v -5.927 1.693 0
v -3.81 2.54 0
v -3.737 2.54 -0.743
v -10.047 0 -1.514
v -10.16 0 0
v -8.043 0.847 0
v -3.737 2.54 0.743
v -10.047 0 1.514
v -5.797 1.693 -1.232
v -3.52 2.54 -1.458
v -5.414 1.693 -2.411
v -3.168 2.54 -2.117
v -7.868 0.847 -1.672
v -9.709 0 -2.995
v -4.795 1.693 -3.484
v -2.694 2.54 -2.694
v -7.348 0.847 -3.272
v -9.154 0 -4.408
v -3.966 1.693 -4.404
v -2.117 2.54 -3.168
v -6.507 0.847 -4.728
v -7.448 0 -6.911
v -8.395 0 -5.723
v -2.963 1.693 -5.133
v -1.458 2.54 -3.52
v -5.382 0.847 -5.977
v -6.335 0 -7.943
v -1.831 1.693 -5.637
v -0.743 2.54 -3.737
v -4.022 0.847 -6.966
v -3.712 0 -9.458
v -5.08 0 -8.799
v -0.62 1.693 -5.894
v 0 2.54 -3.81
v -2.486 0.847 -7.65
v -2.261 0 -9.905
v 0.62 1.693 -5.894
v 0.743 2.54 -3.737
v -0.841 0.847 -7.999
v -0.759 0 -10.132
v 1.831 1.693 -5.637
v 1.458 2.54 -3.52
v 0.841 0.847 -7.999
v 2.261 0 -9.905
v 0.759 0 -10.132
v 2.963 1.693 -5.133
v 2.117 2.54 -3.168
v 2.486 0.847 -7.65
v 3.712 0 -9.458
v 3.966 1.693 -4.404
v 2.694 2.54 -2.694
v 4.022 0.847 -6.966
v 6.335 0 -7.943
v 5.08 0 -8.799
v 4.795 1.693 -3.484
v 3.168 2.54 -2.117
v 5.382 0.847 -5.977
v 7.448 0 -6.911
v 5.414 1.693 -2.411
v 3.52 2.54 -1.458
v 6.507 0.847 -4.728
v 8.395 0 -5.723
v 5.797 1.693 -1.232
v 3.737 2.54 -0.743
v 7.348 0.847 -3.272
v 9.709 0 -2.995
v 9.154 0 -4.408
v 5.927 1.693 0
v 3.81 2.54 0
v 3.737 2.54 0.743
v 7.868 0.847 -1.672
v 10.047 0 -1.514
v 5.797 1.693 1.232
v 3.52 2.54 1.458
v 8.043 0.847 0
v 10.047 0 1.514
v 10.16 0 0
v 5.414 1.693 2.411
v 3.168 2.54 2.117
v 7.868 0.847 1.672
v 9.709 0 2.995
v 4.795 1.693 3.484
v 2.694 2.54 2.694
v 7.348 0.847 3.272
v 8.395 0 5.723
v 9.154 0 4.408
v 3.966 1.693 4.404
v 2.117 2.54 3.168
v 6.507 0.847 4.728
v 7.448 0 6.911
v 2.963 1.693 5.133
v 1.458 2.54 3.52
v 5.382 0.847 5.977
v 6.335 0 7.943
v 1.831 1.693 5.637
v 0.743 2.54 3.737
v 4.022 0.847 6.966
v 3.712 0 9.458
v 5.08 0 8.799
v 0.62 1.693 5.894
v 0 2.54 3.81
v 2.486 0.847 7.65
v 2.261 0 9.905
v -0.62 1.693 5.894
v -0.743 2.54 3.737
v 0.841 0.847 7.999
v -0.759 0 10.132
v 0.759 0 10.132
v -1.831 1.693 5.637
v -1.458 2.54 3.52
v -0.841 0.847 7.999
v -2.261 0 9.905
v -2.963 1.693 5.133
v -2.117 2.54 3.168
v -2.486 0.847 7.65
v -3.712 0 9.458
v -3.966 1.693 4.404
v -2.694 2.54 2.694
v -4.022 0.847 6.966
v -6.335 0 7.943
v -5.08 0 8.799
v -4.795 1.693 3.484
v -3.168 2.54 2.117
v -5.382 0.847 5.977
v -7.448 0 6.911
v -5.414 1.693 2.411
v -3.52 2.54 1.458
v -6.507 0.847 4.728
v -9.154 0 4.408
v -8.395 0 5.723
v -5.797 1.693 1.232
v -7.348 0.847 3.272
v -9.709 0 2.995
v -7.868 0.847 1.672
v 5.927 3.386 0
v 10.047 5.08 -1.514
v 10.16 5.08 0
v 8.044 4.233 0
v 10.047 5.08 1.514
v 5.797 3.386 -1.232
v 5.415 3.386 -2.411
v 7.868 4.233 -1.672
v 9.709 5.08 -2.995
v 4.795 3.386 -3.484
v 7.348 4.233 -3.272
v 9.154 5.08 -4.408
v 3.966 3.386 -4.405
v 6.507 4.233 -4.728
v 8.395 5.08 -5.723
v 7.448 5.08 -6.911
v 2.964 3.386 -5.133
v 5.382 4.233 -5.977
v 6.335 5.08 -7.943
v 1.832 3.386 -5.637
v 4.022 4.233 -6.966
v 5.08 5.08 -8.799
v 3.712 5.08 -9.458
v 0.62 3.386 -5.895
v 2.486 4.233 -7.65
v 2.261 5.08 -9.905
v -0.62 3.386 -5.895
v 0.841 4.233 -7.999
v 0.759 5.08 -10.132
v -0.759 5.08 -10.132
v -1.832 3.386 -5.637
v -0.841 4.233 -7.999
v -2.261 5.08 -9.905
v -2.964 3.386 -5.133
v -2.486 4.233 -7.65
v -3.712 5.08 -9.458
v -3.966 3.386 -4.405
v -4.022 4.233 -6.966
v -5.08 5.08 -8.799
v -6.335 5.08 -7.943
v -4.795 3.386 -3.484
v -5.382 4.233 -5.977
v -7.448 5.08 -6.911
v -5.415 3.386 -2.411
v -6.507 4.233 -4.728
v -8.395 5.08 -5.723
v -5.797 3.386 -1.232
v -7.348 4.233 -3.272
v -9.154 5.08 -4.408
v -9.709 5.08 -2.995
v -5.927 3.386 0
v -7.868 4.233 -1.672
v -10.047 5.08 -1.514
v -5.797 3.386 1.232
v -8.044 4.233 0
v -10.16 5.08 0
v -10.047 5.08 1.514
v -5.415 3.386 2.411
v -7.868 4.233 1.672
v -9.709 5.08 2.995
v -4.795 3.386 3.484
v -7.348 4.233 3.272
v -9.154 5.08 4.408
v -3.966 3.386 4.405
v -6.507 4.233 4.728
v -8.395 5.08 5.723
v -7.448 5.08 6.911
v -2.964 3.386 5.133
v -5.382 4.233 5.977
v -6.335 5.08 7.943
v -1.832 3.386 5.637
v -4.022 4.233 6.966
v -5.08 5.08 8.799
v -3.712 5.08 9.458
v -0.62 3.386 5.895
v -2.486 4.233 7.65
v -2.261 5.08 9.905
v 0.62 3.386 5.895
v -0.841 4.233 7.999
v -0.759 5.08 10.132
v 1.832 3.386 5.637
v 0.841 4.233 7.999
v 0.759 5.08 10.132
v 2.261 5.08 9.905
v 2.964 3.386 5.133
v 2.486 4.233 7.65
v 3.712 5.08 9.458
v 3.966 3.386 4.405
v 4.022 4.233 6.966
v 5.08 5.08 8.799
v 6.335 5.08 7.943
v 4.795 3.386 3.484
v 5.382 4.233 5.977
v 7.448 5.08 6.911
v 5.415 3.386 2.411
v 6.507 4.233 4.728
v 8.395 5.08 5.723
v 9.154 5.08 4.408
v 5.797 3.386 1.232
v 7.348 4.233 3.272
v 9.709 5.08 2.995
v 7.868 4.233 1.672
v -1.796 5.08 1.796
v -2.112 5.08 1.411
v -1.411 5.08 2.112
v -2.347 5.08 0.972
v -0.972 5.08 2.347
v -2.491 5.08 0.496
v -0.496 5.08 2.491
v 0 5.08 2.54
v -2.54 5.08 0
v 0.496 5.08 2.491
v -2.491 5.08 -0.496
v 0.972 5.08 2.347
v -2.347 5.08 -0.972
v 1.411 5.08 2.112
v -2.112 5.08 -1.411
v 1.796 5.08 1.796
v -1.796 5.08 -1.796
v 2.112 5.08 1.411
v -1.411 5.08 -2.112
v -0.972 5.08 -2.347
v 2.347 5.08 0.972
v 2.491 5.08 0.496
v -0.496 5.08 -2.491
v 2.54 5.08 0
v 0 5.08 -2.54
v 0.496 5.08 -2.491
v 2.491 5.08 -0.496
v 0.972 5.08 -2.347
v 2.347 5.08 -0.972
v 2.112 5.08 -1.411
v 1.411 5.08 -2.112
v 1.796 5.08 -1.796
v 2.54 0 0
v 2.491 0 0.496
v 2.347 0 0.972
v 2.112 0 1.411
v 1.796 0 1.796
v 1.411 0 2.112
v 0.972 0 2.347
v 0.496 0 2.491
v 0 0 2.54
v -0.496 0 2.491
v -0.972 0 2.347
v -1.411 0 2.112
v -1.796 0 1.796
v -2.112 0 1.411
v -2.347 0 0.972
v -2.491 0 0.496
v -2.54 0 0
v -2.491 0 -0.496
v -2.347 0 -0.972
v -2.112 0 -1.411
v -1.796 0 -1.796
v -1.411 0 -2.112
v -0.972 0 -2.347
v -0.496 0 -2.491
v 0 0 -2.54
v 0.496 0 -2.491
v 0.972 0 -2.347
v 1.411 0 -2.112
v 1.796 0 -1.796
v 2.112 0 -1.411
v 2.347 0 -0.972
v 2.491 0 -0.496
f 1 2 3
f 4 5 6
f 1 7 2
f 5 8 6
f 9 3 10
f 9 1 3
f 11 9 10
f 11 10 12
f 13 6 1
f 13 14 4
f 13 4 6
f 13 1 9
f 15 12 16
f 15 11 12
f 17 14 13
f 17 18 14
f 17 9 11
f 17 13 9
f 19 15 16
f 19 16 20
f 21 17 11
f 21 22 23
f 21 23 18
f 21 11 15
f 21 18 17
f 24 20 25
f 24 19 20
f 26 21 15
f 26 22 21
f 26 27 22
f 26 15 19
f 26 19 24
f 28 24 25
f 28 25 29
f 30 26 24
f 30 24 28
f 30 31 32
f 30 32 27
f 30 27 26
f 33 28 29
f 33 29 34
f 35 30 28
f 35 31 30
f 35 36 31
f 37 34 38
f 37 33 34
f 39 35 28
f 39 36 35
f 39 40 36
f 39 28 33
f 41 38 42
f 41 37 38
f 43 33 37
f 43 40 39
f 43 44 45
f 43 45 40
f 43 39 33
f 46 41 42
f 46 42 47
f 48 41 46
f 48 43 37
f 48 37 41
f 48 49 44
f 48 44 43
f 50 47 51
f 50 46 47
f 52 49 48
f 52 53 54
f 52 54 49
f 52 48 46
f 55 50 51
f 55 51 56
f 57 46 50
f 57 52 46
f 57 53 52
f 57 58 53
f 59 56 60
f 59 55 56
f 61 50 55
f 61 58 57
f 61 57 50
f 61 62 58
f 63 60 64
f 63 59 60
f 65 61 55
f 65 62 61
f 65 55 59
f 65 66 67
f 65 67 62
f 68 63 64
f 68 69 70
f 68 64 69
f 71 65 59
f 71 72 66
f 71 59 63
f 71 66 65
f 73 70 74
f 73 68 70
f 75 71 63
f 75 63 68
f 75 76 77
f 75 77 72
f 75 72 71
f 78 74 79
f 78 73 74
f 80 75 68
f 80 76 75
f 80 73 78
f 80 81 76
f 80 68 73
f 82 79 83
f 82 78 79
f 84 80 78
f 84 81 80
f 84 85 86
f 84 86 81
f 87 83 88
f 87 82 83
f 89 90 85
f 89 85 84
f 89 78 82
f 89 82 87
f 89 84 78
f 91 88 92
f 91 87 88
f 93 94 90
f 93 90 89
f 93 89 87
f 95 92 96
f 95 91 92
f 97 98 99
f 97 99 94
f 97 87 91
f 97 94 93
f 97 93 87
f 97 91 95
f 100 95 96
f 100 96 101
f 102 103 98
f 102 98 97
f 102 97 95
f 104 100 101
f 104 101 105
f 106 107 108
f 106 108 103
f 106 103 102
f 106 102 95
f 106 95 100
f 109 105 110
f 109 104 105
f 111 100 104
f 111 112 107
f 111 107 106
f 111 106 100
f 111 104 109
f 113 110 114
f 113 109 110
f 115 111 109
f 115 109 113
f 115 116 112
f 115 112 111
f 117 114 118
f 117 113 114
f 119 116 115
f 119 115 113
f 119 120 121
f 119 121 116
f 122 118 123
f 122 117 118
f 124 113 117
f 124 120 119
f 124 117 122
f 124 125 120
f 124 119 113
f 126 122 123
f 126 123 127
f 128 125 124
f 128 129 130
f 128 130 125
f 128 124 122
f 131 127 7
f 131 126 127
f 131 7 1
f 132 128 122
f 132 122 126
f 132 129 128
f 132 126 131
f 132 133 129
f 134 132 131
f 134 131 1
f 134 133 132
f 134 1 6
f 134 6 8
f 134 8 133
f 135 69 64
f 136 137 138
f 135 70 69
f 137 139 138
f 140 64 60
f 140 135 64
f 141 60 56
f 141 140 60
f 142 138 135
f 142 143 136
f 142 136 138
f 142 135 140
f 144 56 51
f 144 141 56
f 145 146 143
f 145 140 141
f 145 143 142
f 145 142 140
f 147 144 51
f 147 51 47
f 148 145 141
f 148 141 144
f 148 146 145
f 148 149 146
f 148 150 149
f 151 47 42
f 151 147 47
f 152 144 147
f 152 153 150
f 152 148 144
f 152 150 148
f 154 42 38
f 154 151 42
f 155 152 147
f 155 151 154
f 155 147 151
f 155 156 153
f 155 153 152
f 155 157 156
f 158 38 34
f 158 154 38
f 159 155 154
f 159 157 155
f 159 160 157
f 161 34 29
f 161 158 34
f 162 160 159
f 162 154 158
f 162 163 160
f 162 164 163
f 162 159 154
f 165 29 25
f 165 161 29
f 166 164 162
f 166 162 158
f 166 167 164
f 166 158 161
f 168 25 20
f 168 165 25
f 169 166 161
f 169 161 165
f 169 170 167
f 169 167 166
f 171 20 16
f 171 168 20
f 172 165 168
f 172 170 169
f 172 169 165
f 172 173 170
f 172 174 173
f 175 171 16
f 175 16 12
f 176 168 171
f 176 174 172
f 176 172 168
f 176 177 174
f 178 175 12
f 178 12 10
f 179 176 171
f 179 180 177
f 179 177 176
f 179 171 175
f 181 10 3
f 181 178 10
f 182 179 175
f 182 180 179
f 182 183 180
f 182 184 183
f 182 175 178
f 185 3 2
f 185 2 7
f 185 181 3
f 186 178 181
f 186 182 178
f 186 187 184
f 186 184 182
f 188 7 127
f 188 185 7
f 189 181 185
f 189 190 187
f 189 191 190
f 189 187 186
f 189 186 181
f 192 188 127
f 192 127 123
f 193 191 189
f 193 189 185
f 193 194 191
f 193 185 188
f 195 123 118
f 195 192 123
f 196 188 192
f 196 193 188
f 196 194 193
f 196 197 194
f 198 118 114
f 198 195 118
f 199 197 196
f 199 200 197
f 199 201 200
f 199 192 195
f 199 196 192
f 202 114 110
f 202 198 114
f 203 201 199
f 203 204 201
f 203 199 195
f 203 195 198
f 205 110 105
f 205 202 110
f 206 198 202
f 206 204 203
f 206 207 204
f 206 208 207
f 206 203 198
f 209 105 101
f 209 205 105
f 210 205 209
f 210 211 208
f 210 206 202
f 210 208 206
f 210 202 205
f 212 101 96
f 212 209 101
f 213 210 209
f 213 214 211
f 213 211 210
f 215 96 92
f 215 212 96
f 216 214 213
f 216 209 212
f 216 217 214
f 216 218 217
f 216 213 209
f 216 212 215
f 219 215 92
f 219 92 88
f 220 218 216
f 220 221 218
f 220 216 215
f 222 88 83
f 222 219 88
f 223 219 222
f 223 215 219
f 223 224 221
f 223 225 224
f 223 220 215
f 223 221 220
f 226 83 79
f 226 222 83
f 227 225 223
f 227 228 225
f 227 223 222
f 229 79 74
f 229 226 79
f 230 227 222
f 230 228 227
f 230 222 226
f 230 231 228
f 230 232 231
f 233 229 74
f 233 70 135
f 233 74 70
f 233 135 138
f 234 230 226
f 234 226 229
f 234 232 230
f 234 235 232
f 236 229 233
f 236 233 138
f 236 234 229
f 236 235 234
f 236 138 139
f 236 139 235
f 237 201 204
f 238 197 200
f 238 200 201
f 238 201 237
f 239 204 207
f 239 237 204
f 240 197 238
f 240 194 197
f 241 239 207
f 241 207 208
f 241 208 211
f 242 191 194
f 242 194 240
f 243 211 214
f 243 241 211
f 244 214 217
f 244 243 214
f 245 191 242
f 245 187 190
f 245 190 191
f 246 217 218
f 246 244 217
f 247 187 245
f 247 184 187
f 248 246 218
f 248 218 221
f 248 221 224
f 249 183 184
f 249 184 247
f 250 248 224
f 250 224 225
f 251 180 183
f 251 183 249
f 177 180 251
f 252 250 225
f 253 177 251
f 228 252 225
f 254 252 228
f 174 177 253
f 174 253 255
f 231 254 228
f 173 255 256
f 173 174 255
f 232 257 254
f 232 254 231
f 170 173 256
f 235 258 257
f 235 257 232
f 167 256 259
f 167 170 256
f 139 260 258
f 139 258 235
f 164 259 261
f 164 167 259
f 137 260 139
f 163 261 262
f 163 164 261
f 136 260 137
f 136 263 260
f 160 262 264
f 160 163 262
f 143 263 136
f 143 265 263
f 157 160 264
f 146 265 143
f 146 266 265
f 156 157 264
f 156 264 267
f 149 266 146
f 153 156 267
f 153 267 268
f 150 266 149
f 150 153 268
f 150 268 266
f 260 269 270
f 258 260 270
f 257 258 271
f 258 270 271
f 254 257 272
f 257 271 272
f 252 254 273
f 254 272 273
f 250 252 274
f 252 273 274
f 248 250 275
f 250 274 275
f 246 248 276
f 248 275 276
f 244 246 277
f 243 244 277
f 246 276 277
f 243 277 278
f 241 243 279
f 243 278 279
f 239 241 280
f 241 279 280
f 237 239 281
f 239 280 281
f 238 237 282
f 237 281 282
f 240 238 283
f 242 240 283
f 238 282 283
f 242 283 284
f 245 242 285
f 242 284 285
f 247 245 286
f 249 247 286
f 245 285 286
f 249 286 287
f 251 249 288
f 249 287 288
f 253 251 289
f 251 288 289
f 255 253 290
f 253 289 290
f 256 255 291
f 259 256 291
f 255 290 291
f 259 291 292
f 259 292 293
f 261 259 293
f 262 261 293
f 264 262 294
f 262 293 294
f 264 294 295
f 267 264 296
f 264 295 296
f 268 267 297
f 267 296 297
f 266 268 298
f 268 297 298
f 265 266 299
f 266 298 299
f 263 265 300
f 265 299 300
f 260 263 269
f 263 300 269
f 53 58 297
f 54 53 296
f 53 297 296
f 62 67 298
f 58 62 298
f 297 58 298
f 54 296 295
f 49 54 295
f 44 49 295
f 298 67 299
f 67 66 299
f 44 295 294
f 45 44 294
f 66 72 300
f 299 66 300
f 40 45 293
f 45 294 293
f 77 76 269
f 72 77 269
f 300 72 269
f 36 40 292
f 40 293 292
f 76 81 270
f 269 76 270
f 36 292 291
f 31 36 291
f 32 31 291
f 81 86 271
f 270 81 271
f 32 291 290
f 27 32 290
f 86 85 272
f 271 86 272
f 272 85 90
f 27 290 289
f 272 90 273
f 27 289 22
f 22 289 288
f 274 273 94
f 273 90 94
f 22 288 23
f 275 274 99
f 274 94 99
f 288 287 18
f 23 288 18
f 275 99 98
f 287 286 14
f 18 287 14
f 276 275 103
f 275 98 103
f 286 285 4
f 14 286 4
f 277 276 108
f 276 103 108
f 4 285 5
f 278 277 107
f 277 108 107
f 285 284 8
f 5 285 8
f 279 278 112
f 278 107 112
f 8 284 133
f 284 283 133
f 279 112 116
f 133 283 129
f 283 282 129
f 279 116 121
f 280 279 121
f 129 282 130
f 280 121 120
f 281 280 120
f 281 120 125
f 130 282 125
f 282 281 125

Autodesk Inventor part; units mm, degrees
ref_plane "YZ Plane" through (0, 0, 0) normal (1, 0, 0) x (0, 1, 0)
ref_plane "XZ Plane" through (0, 0, 0) normal (0, 1, 0) x (-1, 0, 0)
ref_plane "XY Plane" through (0, 0, 0) normal (0, 0, 1) x (1, 0, 0)
sketch "Sketch1" plane through (0, 0, 0) normal (0, 1, 0) x (-1, 0, 0)
  circle A0 centre (0, 0) radius 10.16
  dimension "d0" = 20.32
extrude "Extrusion1" add sketch "Sketch1" along normal blind 2.54
chamfer "Chamfer1" distance 6.35 distance2 2.54 1 edges at (10.16, 2.54, 0) measured on face at (-6.5114, 2.54, 0.3794)
sketch "Sketch2" plane through (0, 2.54, 0) normal (0, 1, 0) x (1, 0, 0)
  circle A0 centre (0, 0) radius 10.16
extrude "Extrusion2" add sketch "Sketch2" along normal blind 2.54
chamfer "Chamfer2" distance 6.35 distance2 2.54 1 edges at (-10.16, 2.54, 0) measured on face at (7.9081, 2.54, 1.1144)
sketch "Sketch3" plane through (0, 0, 0) normal (0, -1, 0) x (1, 0, 0)
  circle A0 centre (0, 0) radius 3.81 projected
  circle A1 centre (0, 0) radius 2.54
  dimension "d11" = 5.08
extrude "Extrusion3" cut sketch "Sketch3" against normal blind 5.08 contours A1
properties part number "Pulley"
